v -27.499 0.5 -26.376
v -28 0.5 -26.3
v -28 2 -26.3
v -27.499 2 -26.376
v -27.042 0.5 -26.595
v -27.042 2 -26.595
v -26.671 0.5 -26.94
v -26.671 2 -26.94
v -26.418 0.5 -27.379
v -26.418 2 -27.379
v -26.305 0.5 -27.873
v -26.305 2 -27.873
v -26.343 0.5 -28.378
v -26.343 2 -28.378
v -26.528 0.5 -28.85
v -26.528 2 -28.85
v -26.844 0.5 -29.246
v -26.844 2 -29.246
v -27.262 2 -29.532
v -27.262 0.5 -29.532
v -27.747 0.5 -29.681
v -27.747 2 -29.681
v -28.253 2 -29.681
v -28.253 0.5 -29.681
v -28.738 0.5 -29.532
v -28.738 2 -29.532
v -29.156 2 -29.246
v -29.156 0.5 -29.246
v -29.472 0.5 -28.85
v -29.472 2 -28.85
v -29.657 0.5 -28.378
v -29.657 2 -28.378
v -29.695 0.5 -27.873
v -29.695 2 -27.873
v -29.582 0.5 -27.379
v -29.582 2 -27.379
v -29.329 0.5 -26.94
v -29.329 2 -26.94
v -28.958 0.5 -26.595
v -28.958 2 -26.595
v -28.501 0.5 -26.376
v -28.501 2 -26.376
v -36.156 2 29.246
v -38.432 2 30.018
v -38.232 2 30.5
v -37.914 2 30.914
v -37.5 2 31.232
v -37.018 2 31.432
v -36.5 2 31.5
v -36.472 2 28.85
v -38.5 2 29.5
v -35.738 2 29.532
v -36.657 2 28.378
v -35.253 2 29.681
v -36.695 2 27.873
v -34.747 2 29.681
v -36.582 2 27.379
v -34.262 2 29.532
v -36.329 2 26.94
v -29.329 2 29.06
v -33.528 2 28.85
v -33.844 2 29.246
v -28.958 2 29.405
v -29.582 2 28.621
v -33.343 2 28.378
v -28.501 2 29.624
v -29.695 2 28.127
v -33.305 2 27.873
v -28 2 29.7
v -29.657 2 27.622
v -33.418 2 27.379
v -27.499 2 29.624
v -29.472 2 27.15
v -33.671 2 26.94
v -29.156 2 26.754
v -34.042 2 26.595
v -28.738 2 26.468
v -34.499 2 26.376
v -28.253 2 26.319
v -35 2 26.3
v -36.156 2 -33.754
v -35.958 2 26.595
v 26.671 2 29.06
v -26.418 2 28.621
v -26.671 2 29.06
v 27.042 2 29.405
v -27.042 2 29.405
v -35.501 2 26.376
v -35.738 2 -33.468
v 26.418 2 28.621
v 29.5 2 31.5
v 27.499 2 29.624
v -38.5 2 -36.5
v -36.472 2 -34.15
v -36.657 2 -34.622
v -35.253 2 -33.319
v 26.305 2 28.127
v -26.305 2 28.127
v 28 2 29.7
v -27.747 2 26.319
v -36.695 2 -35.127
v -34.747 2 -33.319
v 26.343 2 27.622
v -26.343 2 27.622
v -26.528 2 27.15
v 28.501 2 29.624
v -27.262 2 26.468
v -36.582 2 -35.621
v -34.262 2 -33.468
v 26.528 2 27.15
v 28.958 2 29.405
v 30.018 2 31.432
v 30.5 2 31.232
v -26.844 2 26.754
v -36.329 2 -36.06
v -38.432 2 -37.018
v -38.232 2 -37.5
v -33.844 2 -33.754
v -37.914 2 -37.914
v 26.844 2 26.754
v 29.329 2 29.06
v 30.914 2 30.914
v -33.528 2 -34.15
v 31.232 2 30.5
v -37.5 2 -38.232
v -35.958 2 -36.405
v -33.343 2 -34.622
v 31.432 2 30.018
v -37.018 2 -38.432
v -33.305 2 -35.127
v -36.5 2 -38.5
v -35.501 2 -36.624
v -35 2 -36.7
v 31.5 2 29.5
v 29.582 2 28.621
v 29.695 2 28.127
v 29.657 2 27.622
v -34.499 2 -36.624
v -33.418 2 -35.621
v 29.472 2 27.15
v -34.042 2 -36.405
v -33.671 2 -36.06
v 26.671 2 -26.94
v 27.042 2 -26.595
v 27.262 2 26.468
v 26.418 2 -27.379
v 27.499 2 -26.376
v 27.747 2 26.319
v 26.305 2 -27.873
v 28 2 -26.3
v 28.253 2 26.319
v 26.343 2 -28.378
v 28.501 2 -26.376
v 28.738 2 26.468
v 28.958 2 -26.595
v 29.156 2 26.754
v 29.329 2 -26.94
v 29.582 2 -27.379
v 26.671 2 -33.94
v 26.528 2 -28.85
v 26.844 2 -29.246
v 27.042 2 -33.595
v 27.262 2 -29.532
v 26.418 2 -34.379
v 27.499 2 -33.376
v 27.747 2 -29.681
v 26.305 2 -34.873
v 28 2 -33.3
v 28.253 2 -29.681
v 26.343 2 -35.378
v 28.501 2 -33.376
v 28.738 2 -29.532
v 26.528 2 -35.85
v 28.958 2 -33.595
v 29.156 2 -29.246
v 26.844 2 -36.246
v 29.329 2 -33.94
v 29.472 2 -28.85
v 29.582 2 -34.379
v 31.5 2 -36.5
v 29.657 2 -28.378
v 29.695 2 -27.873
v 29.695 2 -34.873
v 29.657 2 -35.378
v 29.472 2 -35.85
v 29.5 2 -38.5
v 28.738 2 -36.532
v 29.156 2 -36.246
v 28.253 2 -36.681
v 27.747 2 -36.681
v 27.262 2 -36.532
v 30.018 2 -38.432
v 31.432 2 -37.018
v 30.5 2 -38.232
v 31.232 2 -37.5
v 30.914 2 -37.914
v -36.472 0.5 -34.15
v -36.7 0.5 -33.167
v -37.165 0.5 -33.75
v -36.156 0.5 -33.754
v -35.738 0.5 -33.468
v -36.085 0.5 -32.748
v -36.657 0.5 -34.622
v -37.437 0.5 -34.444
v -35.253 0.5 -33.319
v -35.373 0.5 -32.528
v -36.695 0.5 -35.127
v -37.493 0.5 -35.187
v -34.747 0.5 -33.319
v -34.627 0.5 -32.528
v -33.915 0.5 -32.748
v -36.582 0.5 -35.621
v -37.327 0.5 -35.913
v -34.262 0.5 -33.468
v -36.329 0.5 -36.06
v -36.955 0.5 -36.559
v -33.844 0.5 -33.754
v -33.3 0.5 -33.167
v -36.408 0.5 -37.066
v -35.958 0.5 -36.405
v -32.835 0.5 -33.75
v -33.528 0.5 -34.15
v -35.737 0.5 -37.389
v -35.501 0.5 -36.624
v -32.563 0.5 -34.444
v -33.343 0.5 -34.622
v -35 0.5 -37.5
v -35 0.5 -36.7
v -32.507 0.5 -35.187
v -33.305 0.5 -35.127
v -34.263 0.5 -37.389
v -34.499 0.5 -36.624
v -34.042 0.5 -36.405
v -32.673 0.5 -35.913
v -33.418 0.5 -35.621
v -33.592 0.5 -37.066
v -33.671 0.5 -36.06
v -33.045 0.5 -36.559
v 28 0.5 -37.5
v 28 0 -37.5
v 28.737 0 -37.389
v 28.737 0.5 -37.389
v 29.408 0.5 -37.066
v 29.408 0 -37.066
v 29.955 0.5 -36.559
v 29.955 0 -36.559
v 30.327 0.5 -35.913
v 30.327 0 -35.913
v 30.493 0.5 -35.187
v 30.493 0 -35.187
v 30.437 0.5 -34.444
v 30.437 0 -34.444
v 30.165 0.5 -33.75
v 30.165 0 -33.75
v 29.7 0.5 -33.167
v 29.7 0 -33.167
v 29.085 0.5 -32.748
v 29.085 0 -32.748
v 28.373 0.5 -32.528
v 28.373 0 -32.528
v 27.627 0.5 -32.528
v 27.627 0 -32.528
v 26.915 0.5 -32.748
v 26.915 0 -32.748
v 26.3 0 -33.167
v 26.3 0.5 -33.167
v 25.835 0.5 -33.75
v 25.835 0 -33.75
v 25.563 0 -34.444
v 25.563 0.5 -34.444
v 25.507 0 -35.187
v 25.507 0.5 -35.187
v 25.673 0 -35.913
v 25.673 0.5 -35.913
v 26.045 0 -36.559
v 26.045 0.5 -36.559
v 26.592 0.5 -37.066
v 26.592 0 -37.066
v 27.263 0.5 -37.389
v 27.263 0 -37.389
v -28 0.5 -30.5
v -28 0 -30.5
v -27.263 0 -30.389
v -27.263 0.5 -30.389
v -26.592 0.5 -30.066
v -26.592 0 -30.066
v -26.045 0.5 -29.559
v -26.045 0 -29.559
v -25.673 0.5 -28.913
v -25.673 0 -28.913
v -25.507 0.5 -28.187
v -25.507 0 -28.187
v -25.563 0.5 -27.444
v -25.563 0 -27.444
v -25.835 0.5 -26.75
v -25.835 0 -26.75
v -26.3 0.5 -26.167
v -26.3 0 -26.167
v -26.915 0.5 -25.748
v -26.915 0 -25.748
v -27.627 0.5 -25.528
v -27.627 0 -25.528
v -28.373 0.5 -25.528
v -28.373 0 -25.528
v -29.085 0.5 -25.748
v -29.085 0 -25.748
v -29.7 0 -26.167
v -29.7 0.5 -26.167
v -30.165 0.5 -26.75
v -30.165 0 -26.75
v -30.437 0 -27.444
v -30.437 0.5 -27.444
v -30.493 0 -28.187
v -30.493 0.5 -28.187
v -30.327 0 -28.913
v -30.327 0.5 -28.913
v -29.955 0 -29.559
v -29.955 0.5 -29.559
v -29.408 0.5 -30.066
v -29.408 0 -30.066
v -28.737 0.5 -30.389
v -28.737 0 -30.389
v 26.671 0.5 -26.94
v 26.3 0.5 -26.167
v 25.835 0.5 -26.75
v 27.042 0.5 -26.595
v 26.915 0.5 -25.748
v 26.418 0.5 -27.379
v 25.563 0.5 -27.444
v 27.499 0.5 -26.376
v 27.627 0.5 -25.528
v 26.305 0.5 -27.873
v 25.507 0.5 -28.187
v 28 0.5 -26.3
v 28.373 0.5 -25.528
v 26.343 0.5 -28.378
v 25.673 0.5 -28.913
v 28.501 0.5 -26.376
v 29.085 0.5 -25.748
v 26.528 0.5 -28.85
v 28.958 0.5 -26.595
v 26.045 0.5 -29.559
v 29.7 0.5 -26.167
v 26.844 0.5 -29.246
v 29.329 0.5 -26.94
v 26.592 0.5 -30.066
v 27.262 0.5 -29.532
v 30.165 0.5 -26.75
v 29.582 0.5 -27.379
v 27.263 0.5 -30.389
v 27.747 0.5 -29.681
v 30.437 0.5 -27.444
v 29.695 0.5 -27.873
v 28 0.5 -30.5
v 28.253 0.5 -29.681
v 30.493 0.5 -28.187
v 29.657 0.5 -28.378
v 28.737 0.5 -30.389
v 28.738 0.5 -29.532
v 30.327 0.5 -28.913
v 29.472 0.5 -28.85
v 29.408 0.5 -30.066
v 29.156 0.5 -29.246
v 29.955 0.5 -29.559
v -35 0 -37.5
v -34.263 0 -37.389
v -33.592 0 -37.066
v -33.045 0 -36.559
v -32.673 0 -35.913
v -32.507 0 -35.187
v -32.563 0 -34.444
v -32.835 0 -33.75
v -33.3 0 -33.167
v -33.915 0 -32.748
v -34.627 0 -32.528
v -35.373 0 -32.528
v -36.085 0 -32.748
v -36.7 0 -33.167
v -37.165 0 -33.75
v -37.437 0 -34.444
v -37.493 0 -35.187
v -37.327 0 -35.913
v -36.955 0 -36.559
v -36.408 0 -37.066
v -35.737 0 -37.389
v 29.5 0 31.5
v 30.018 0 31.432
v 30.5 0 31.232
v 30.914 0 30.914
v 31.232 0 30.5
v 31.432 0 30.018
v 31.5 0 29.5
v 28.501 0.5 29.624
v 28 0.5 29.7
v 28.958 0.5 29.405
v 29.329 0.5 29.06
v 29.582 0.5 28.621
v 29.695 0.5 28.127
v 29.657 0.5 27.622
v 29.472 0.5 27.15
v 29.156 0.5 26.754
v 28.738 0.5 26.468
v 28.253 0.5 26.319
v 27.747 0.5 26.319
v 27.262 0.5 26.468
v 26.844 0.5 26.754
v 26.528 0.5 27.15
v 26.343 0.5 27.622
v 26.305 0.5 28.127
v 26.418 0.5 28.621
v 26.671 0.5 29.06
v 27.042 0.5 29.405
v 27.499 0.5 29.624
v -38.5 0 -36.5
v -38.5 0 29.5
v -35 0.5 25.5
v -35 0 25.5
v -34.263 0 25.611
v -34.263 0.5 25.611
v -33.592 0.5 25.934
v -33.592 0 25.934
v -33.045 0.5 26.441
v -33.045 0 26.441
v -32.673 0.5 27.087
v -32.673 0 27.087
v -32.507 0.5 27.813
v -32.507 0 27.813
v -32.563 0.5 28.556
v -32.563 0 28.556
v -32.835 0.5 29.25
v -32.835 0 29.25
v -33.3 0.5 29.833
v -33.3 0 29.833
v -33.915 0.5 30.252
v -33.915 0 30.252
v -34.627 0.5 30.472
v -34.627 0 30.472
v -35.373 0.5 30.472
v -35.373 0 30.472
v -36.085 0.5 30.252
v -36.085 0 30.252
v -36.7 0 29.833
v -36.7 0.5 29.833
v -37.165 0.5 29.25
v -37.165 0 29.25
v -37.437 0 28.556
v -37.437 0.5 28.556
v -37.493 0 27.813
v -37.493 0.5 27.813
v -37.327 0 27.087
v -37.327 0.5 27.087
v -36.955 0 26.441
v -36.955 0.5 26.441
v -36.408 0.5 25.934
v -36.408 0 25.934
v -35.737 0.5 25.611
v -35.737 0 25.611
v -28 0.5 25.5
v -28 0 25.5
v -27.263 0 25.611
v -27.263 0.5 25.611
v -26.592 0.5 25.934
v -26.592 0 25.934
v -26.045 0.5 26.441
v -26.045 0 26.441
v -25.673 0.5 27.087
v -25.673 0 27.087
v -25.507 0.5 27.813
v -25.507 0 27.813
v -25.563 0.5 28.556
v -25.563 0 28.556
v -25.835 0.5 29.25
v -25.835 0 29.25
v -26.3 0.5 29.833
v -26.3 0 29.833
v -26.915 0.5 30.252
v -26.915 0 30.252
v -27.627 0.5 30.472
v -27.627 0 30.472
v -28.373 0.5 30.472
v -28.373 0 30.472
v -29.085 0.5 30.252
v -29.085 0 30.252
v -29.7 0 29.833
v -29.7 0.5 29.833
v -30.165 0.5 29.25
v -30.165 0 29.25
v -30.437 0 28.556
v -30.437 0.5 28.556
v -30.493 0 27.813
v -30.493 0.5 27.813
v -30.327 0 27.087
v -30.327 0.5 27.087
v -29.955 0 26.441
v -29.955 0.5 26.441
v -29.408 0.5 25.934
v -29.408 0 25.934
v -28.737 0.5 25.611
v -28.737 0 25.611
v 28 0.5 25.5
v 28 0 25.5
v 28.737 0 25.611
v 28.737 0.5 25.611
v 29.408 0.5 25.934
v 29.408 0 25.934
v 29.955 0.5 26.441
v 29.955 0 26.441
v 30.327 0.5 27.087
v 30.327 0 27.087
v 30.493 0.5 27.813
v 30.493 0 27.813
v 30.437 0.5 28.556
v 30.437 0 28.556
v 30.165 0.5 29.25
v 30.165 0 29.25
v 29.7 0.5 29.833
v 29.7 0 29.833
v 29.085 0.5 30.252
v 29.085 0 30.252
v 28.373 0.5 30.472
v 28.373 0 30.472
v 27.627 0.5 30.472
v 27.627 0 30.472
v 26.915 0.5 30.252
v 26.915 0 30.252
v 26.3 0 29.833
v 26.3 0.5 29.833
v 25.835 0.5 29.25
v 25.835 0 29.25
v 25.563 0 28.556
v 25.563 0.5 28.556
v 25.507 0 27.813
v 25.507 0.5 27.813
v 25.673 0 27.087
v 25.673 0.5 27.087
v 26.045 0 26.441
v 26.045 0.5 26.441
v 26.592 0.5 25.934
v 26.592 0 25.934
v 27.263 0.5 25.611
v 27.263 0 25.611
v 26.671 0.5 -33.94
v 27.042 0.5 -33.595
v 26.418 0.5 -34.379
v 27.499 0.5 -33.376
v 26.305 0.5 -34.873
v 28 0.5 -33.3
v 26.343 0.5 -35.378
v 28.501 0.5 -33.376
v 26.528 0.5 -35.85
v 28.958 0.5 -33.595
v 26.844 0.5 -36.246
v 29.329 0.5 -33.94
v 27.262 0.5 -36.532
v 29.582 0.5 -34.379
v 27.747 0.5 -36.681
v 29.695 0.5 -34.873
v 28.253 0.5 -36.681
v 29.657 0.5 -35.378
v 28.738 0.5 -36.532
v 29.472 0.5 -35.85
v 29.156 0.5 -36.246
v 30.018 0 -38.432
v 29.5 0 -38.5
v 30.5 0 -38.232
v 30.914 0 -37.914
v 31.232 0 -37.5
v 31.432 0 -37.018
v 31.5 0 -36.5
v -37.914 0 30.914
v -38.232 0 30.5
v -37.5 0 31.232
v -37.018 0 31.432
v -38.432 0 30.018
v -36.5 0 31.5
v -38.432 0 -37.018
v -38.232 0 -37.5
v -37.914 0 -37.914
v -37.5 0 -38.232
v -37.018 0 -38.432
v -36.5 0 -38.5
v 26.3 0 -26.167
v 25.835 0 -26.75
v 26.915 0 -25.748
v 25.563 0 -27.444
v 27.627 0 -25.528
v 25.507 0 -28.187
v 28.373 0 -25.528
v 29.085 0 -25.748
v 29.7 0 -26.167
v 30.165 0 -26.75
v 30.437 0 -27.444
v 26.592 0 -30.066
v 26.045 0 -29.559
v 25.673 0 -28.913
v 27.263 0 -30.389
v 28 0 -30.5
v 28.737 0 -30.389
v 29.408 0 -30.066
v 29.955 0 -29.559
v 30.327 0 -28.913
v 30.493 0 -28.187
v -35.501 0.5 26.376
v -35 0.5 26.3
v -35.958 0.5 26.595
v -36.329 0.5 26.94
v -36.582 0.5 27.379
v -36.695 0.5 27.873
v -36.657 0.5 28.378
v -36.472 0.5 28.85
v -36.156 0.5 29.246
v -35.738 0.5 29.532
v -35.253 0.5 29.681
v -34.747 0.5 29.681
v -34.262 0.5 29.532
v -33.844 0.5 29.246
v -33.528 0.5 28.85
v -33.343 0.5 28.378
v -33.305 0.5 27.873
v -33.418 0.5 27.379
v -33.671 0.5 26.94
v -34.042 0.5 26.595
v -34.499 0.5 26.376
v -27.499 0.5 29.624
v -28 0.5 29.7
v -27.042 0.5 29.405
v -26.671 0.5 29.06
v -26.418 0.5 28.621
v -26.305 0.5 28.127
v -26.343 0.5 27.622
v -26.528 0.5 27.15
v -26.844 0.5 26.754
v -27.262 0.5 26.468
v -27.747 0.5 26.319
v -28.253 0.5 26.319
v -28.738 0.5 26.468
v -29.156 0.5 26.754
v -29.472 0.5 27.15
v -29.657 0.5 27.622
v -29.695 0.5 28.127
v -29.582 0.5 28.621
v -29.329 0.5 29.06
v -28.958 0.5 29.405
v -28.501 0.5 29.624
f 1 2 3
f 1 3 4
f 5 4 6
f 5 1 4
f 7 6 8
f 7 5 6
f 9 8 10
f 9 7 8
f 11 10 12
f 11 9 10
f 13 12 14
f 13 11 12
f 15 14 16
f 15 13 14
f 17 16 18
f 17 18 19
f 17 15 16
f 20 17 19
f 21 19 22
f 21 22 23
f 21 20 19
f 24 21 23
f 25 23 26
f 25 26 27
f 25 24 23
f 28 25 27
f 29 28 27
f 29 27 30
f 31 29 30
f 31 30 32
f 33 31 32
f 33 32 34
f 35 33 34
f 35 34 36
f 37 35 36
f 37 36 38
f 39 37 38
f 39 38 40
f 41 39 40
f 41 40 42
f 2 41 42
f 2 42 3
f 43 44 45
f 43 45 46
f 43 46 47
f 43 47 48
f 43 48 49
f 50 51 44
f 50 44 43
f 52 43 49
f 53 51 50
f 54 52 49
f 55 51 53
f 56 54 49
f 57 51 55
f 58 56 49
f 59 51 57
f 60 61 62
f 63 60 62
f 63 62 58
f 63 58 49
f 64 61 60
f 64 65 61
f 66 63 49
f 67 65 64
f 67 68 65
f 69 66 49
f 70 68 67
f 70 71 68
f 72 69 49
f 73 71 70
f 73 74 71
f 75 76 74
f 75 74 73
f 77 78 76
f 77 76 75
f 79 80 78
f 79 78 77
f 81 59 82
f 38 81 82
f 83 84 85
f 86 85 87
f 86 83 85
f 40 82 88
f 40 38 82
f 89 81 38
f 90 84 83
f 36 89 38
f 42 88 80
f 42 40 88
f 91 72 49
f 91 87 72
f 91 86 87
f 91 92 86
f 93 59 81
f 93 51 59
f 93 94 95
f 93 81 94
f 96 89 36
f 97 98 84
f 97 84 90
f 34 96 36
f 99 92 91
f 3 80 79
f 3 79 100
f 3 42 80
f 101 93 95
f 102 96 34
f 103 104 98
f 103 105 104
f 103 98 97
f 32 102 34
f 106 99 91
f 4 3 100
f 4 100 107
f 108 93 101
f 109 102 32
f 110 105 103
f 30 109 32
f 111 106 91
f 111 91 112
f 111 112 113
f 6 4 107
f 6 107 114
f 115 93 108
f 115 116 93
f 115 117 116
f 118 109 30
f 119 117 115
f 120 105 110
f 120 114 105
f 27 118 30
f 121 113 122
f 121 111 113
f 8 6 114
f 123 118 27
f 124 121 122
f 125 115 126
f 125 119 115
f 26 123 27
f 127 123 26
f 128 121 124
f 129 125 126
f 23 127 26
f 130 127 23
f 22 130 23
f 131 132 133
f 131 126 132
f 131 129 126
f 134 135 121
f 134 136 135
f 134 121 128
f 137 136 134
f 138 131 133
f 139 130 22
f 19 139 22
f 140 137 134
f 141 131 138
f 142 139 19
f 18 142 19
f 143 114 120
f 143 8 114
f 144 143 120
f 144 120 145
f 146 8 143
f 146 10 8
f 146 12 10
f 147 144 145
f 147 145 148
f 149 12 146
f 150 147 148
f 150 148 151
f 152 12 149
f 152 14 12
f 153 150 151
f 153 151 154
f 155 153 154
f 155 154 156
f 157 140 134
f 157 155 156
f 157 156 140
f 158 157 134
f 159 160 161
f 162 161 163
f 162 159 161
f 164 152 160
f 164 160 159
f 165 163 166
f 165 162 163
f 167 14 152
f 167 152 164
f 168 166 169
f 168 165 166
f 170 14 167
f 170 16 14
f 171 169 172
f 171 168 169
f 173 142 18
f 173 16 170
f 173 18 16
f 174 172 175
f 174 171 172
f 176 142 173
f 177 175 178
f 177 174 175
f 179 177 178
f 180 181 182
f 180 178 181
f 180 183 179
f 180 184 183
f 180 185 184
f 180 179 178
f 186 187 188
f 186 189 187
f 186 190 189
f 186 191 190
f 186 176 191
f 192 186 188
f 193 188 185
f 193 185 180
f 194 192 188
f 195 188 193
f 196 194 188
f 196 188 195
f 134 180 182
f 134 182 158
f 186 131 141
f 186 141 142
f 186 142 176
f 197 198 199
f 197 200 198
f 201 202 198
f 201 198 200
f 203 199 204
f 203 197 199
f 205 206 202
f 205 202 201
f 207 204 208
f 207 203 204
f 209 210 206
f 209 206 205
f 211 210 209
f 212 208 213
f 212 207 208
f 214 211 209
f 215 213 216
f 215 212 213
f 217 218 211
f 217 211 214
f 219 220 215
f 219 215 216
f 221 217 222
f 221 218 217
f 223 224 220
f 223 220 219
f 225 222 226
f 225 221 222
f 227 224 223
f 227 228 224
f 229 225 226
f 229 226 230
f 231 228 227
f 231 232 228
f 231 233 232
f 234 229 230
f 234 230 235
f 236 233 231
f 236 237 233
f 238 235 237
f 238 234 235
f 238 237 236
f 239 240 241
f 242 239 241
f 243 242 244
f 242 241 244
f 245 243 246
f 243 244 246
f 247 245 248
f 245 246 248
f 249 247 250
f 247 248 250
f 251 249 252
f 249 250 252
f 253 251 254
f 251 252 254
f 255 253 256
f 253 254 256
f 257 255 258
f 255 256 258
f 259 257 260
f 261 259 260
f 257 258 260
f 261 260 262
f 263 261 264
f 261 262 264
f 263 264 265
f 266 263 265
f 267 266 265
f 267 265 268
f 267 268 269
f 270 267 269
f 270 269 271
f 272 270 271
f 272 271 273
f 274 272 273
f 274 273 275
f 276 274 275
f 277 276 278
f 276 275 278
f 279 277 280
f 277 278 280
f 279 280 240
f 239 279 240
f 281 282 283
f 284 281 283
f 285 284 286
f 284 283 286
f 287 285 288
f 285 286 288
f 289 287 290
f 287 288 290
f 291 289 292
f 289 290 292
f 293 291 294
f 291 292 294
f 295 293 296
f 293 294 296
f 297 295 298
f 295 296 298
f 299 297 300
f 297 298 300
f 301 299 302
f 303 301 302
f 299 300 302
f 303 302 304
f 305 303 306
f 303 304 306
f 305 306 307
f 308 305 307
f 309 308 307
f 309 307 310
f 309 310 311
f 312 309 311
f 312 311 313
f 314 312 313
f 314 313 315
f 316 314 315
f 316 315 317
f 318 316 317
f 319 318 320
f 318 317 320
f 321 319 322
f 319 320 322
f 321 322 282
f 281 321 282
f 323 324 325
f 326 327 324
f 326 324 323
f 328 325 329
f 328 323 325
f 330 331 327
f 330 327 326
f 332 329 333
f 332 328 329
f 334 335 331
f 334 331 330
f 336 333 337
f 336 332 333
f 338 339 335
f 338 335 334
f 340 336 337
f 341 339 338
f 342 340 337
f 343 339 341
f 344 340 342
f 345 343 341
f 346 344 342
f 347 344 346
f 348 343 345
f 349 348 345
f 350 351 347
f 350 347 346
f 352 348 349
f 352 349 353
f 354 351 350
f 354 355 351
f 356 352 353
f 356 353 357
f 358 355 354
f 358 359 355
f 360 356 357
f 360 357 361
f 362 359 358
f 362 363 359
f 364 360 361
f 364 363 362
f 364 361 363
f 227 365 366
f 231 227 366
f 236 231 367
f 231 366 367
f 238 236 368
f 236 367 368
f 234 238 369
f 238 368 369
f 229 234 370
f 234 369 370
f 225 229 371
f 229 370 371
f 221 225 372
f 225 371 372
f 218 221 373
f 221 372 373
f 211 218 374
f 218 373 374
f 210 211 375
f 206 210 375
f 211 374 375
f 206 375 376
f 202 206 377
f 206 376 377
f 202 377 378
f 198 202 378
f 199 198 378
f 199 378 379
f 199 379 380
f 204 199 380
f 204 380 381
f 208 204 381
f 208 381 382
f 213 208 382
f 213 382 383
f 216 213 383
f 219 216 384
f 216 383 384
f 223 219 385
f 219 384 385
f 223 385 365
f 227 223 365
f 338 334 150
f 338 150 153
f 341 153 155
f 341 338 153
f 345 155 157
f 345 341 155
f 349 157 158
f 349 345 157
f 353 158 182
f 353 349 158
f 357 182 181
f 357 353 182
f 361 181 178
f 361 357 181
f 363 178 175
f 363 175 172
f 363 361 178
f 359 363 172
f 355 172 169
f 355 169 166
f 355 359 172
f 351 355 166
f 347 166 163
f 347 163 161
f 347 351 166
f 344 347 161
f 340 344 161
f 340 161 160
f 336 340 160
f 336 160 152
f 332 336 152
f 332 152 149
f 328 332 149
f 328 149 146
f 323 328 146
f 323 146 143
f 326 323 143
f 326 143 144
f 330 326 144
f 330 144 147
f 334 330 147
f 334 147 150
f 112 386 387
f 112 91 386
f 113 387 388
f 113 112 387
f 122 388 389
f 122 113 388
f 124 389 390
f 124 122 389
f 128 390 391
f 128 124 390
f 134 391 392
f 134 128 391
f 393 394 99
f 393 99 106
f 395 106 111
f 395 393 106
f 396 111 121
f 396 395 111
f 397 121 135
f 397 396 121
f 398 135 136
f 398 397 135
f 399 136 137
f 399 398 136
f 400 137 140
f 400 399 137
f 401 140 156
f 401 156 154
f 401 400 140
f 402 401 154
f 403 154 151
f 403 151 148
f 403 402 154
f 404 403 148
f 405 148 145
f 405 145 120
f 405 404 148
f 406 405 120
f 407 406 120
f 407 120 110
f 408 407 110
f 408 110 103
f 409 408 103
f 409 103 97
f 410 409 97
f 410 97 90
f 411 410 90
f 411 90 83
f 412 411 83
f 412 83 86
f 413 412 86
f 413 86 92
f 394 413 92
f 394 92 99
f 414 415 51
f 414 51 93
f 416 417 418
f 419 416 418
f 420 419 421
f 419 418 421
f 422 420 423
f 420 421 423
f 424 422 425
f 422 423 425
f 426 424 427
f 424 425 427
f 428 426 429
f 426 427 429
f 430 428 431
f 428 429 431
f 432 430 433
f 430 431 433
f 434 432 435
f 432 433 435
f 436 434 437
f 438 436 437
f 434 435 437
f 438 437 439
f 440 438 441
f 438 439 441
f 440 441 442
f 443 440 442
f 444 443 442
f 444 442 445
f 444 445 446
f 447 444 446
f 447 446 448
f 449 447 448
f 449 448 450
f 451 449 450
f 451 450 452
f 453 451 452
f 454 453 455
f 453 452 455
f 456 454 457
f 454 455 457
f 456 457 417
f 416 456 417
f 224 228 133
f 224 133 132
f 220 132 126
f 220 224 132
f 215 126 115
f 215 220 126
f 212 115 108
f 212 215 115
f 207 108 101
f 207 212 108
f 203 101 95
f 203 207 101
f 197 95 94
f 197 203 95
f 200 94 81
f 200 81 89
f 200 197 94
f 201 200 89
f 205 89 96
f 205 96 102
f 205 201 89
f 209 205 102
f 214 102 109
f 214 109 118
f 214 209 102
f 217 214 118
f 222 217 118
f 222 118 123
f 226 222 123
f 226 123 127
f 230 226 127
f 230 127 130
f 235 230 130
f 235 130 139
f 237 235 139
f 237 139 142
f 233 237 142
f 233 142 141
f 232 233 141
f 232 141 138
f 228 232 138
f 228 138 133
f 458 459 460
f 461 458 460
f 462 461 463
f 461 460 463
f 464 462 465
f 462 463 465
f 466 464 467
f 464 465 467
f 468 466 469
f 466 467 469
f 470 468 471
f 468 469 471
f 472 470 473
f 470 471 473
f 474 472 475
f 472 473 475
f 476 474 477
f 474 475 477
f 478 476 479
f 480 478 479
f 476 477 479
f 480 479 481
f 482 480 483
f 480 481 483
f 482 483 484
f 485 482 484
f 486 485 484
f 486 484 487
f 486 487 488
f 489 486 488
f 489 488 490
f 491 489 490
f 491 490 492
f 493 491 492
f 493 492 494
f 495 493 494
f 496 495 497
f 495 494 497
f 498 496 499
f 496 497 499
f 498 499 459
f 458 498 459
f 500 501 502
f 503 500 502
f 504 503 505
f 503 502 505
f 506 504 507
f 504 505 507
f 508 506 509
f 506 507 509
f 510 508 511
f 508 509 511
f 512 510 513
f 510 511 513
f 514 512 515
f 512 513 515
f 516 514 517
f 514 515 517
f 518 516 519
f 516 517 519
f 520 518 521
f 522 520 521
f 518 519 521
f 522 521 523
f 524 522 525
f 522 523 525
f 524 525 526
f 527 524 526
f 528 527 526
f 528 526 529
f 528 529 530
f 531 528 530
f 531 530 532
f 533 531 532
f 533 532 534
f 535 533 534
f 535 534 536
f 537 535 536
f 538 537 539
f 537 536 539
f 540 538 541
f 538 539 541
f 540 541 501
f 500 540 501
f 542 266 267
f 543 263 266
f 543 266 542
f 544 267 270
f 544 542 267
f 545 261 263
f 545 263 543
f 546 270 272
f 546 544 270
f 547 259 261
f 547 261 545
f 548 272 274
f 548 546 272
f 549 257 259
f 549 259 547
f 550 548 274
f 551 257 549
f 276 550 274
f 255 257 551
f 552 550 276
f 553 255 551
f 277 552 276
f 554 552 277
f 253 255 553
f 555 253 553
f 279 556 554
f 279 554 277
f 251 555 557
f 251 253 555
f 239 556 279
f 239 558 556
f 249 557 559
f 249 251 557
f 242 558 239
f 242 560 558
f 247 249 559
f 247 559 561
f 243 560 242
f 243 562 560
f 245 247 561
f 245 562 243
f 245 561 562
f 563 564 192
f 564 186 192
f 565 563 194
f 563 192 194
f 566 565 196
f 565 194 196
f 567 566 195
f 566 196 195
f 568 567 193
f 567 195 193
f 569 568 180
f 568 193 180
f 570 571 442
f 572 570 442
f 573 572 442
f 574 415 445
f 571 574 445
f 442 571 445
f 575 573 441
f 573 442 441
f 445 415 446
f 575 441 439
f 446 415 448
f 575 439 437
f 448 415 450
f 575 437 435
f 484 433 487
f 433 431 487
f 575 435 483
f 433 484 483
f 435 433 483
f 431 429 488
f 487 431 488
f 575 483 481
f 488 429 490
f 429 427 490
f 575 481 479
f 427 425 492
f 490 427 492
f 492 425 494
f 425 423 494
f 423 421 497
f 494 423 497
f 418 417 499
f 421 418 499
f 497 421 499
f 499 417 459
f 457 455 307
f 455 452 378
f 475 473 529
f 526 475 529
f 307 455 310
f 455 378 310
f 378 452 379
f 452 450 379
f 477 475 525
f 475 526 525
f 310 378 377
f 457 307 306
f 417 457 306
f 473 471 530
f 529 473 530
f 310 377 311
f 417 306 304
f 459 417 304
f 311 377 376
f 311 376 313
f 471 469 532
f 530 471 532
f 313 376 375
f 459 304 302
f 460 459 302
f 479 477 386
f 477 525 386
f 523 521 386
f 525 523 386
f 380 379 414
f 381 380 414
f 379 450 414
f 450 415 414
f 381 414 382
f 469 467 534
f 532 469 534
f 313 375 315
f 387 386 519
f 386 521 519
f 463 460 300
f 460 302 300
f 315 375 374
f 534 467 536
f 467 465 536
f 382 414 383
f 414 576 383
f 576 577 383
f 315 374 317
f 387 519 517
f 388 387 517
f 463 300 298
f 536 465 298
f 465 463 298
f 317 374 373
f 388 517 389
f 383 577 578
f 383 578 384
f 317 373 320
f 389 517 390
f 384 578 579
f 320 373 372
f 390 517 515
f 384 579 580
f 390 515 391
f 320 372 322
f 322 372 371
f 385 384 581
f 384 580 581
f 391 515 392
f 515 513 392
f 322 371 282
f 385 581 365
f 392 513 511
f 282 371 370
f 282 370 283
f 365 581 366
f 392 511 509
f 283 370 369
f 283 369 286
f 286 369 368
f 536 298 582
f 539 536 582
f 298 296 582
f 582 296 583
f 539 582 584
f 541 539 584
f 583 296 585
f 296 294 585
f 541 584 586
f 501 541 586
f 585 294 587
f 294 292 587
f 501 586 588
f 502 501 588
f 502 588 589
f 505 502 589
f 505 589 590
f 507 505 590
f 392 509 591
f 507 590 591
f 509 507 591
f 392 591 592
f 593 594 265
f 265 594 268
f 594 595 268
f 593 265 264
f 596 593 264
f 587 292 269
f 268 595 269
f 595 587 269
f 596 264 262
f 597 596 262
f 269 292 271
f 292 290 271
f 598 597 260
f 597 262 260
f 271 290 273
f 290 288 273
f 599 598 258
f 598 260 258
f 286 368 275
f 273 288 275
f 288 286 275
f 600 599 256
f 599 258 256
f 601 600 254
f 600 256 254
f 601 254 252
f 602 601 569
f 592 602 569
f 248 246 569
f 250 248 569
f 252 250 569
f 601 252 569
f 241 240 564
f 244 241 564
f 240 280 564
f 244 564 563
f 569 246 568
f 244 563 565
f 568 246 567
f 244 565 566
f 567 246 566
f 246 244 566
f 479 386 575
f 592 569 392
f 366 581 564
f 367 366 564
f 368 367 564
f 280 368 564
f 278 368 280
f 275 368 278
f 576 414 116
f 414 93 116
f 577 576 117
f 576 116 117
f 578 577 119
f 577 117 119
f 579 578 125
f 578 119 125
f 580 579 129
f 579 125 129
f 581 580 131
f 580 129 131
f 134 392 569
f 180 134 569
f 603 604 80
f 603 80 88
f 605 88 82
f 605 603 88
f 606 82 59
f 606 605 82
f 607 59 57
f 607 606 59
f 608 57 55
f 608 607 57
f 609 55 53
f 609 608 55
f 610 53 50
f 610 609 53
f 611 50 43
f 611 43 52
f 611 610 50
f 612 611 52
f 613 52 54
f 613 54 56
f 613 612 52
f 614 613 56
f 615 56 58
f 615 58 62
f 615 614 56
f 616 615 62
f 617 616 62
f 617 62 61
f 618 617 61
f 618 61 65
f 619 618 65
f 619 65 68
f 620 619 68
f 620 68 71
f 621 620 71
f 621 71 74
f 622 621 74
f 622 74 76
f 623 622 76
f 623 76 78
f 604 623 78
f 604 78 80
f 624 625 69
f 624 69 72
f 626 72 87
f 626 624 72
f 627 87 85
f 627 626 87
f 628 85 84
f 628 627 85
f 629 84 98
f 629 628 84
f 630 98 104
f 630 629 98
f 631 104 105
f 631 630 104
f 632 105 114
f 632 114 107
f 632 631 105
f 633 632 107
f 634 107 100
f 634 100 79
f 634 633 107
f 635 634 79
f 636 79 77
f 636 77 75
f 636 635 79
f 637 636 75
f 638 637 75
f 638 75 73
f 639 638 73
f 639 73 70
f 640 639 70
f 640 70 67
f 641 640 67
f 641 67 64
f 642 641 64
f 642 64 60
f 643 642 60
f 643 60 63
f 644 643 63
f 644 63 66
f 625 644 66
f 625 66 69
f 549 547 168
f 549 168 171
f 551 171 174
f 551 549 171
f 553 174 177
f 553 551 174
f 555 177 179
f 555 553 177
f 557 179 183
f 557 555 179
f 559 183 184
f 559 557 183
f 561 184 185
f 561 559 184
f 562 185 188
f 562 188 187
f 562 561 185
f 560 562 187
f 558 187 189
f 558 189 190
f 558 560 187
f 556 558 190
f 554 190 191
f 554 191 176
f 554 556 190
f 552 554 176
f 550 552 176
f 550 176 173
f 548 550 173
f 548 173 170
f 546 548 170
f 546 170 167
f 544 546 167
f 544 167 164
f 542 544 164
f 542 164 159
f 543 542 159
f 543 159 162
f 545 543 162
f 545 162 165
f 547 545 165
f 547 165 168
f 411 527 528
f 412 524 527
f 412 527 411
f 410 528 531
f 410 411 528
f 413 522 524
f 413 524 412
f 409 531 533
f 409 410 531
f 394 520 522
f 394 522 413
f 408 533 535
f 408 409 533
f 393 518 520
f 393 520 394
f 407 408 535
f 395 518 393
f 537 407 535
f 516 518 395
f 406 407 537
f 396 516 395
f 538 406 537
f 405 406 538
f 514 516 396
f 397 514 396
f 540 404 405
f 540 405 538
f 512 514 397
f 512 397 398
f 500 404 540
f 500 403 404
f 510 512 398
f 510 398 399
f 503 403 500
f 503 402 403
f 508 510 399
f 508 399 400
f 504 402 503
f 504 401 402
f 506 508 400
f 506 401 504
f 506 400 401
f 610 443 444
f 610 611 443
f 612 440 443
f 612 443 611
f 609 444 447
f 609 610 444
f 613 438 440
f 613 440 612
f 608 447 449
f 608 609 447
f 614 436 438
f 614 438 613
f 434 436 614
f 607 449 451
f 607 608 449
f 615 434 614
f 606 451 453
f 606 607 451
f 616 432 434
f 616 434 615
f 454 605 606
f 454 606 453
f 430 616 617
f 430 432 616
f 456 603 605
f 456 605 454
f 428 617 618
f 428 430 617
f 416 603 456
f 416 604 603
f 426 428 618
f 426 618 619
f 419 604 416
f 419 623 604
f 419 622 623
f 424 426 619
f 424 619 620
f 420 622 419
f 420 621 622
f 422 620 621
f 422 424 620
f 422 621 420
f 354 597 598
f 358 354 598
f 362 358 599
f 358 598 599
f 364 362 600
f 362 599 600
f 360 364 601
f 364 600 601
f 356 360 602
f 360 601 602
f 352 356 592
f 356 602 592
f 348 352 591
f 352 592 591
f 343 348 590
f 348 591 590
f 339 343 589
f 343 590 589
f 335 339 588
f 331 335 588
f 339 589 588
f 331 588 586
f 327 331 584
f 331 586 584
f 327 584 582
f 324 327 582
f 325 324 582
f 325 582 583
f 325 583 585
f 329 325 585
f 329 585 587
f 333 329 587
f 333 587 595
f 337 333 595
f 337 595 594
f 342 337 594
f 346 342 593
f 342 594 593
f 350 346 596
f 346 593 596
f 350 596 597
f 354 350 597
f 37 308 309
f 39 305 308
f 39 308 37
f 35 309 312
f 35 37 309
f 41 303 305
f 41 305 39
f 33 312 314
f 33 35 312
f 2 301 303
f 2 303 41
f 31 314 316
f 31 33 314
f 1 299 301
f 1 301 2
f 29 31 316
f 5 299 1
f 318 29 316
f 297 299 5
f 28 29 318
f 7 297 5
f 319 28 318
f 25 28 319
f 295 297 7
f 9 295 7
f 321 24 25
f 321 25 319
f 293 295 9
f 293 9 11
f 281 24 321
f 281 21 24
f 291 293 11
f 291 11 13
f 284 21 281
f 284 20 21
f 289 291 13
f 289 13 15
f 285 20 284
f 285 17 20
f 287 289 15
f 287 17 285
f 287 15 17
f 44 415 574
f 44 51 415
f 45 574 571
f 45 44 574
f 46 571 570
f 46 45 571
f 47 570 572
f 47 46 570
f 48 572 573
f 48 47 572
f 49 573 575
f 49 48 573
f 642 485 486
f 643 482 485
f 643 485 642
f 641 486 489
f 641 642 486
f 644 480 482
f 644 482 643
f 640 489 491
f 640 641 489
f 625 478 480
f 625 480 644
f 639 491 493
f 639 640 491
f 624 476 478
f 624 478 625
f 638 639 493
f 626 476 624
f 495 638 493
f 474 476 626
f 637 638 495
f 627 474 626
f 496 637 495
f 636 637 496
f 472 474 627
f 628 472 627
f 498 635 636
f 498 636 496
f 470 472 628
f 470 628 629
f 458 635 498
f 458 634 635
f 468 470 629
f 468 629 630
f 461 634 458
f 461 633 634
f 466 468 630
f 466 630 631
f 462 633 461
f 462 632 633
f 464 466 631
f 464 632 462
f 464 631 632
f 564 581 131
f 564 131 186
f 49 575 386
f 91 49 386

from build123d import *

# Parameters (mm, degrees)
SKETCH_1_W          = 70
SKETCH_1_H          = 70
SKETCH_1_R          = 1.7
EXTRUDE_1_DEPTH     = 2
FILLET_1_R          = 2
SKETCH_2_R          = 2.5
SKETCH_2_R_2        = 1.7
CUT_EXTRUDE_1_DEPTH = 0.5


with BuildPart() as part:
    # 草图1 → 凸台-拉伸1 (new body)
    with BuildSketch(Plane(origin=(0, 0, 0), x_dir=(1, 0, 0), z_dir=(0, 1, 0))):
        with Locations((-3.5, 3.5)):
            Rectangle(SKETCH_1_W, SKETCH_1_H)
        with Locations(Location((-28, -28, 0), (0, 0, 270))):
            Circle(SKETCH_1_R, mode=Mode.SUBTRACT)
        with Locations(Location((28, -28, 0), (0, 0, 270))):
            Circle(SKETCH_1_R, mode=Mode.SUBTRACT)
        with Locations(Location((28, 28, 0), (0, 0, 270))):
            Circle(SKETCH_1_R, mode=Mode.SUBTRACT)
        with Locations(Location((-28, 28, 0), (0, 0, 270))):
            Circle(SKETCH_1_R, mode=Mode.SUBTRACT)
        with Locations(Location((28, 35, 0), (0, 0, 270))):
            Circle(SKETCH_1_R, mode=Mode.SUBTRACT)
        with Locations(Location((-35, -28, 0), (0, 0, 90))):
            Circle(SKETCH_1_R, mode=Mode.SUBTRACT)
        with Locations(Location((-35, 35, 0), (0, 0, 90))):
            Circle(SKETCH_1_R, mode=Mode.SUBTRACT)
    extrude(amount=EXTRUDE_1_DEPTH)

    # 圆角1
    fillet_1_edges = [part.edges().sort_by_distance(p)[0] for p in [
        (-38.5, 1, -38.5),
        (31.5, 1, -38.5),
        (31.5, 1, 31.5),
        (-38.5, 1, 31.5),
    ]]
    fillet(fillet_1_edges, radius=FILLET_1_R)

    # 草图2 → 切除-拉伸1 (cut)
    # profile 1 of 7: a face of its own
    with BuildSketch(Plane.XZ):
        with Locations(Location((-28, 28, 0), (0, 0, 270))):
            Circle(SKETCH_2_R)
        with Locations(Location((-28, 28, 0), (0, 0, 270))):
            Circle(SKETCH_2_R_2, mode=Mode.SUBTRACT)
    # profile 2 of 7: a face of its own
    with BuildSketch(Plane.XZ):
        with Locations(Location((-35, 28, 0), (0, 0, 270))):
            Circle(SKETCH_2_R)
        with Locations(Location((-35, 28, 0), (0, 0, 270))):
            Circle(SKETCH_2_R_2, mode=Mode.SUBTRACT)
    # profile 3 of 7: a face of its own
    with BuildSketch(Plane.XZ):
        with Locations(Location((28, 28, 0), (0, 0, 270))):
            Circle(SKETCH_2_R)
        with Locations(Location((28, 28, 0), (0, 0, 270))):
            Circle(SKETCH_2_R_2, mode=Mode.SUBTRACT)
    # profile 4 of 7: a face of its own
    with BuildSketch(Plane.XZ):
        with Locations(Location((28, -28, 0), (0, 0, 270))):
            Circle(SKETCH_2_R)
        with Locations(Location((28, -28, 0), (0, 0, 270))):
            Circle(SKETCH_2_R_2, mode=Mode.SUBTRACT)
    # profile 5 of 7: a face of its own
    with BuildSketch(Plane.XZ):
        with Locations(Location((28, -35, 0), (0, 0, 270))):
            Circle(SKETCH_2_R)
        with Locations(Location((28, -35, 0), (0, 0, 270))):
            Circle(SKETCH_2_R_2, mode=Mode.SUBTRACT)
    # profile 6 of 7: a face of its own
    with BuildSketch(Plane.XZ):
        with Locations(Location((-28, -28, 0), (0, 0, 270))):
            Circle(SKETCH_2_R)
        with Locations(Location((-28, -28, 0), (0, 0, 270))):
            Circle(SKETCH_2_R_2, mode=Mode.SUBTRACT)
    # profile 7 of 7: a face of its own
    with BuildSketch(Plane.XZ):
        with Locations(Location((-35, -35, 0), (0, 0, 270))):
            Circle(SKETCH_2_R)
        with Locations(Location((-35, -35, 0), (0, 0, 270))):
            Circle(SKETCH_2_R_2, mode=Mode.SUBTRACT)
    extrude(amount=-CUT_EXTRUDE_1_DEPTH, mode=Mode.SUBTRACT)


solid = part.part
